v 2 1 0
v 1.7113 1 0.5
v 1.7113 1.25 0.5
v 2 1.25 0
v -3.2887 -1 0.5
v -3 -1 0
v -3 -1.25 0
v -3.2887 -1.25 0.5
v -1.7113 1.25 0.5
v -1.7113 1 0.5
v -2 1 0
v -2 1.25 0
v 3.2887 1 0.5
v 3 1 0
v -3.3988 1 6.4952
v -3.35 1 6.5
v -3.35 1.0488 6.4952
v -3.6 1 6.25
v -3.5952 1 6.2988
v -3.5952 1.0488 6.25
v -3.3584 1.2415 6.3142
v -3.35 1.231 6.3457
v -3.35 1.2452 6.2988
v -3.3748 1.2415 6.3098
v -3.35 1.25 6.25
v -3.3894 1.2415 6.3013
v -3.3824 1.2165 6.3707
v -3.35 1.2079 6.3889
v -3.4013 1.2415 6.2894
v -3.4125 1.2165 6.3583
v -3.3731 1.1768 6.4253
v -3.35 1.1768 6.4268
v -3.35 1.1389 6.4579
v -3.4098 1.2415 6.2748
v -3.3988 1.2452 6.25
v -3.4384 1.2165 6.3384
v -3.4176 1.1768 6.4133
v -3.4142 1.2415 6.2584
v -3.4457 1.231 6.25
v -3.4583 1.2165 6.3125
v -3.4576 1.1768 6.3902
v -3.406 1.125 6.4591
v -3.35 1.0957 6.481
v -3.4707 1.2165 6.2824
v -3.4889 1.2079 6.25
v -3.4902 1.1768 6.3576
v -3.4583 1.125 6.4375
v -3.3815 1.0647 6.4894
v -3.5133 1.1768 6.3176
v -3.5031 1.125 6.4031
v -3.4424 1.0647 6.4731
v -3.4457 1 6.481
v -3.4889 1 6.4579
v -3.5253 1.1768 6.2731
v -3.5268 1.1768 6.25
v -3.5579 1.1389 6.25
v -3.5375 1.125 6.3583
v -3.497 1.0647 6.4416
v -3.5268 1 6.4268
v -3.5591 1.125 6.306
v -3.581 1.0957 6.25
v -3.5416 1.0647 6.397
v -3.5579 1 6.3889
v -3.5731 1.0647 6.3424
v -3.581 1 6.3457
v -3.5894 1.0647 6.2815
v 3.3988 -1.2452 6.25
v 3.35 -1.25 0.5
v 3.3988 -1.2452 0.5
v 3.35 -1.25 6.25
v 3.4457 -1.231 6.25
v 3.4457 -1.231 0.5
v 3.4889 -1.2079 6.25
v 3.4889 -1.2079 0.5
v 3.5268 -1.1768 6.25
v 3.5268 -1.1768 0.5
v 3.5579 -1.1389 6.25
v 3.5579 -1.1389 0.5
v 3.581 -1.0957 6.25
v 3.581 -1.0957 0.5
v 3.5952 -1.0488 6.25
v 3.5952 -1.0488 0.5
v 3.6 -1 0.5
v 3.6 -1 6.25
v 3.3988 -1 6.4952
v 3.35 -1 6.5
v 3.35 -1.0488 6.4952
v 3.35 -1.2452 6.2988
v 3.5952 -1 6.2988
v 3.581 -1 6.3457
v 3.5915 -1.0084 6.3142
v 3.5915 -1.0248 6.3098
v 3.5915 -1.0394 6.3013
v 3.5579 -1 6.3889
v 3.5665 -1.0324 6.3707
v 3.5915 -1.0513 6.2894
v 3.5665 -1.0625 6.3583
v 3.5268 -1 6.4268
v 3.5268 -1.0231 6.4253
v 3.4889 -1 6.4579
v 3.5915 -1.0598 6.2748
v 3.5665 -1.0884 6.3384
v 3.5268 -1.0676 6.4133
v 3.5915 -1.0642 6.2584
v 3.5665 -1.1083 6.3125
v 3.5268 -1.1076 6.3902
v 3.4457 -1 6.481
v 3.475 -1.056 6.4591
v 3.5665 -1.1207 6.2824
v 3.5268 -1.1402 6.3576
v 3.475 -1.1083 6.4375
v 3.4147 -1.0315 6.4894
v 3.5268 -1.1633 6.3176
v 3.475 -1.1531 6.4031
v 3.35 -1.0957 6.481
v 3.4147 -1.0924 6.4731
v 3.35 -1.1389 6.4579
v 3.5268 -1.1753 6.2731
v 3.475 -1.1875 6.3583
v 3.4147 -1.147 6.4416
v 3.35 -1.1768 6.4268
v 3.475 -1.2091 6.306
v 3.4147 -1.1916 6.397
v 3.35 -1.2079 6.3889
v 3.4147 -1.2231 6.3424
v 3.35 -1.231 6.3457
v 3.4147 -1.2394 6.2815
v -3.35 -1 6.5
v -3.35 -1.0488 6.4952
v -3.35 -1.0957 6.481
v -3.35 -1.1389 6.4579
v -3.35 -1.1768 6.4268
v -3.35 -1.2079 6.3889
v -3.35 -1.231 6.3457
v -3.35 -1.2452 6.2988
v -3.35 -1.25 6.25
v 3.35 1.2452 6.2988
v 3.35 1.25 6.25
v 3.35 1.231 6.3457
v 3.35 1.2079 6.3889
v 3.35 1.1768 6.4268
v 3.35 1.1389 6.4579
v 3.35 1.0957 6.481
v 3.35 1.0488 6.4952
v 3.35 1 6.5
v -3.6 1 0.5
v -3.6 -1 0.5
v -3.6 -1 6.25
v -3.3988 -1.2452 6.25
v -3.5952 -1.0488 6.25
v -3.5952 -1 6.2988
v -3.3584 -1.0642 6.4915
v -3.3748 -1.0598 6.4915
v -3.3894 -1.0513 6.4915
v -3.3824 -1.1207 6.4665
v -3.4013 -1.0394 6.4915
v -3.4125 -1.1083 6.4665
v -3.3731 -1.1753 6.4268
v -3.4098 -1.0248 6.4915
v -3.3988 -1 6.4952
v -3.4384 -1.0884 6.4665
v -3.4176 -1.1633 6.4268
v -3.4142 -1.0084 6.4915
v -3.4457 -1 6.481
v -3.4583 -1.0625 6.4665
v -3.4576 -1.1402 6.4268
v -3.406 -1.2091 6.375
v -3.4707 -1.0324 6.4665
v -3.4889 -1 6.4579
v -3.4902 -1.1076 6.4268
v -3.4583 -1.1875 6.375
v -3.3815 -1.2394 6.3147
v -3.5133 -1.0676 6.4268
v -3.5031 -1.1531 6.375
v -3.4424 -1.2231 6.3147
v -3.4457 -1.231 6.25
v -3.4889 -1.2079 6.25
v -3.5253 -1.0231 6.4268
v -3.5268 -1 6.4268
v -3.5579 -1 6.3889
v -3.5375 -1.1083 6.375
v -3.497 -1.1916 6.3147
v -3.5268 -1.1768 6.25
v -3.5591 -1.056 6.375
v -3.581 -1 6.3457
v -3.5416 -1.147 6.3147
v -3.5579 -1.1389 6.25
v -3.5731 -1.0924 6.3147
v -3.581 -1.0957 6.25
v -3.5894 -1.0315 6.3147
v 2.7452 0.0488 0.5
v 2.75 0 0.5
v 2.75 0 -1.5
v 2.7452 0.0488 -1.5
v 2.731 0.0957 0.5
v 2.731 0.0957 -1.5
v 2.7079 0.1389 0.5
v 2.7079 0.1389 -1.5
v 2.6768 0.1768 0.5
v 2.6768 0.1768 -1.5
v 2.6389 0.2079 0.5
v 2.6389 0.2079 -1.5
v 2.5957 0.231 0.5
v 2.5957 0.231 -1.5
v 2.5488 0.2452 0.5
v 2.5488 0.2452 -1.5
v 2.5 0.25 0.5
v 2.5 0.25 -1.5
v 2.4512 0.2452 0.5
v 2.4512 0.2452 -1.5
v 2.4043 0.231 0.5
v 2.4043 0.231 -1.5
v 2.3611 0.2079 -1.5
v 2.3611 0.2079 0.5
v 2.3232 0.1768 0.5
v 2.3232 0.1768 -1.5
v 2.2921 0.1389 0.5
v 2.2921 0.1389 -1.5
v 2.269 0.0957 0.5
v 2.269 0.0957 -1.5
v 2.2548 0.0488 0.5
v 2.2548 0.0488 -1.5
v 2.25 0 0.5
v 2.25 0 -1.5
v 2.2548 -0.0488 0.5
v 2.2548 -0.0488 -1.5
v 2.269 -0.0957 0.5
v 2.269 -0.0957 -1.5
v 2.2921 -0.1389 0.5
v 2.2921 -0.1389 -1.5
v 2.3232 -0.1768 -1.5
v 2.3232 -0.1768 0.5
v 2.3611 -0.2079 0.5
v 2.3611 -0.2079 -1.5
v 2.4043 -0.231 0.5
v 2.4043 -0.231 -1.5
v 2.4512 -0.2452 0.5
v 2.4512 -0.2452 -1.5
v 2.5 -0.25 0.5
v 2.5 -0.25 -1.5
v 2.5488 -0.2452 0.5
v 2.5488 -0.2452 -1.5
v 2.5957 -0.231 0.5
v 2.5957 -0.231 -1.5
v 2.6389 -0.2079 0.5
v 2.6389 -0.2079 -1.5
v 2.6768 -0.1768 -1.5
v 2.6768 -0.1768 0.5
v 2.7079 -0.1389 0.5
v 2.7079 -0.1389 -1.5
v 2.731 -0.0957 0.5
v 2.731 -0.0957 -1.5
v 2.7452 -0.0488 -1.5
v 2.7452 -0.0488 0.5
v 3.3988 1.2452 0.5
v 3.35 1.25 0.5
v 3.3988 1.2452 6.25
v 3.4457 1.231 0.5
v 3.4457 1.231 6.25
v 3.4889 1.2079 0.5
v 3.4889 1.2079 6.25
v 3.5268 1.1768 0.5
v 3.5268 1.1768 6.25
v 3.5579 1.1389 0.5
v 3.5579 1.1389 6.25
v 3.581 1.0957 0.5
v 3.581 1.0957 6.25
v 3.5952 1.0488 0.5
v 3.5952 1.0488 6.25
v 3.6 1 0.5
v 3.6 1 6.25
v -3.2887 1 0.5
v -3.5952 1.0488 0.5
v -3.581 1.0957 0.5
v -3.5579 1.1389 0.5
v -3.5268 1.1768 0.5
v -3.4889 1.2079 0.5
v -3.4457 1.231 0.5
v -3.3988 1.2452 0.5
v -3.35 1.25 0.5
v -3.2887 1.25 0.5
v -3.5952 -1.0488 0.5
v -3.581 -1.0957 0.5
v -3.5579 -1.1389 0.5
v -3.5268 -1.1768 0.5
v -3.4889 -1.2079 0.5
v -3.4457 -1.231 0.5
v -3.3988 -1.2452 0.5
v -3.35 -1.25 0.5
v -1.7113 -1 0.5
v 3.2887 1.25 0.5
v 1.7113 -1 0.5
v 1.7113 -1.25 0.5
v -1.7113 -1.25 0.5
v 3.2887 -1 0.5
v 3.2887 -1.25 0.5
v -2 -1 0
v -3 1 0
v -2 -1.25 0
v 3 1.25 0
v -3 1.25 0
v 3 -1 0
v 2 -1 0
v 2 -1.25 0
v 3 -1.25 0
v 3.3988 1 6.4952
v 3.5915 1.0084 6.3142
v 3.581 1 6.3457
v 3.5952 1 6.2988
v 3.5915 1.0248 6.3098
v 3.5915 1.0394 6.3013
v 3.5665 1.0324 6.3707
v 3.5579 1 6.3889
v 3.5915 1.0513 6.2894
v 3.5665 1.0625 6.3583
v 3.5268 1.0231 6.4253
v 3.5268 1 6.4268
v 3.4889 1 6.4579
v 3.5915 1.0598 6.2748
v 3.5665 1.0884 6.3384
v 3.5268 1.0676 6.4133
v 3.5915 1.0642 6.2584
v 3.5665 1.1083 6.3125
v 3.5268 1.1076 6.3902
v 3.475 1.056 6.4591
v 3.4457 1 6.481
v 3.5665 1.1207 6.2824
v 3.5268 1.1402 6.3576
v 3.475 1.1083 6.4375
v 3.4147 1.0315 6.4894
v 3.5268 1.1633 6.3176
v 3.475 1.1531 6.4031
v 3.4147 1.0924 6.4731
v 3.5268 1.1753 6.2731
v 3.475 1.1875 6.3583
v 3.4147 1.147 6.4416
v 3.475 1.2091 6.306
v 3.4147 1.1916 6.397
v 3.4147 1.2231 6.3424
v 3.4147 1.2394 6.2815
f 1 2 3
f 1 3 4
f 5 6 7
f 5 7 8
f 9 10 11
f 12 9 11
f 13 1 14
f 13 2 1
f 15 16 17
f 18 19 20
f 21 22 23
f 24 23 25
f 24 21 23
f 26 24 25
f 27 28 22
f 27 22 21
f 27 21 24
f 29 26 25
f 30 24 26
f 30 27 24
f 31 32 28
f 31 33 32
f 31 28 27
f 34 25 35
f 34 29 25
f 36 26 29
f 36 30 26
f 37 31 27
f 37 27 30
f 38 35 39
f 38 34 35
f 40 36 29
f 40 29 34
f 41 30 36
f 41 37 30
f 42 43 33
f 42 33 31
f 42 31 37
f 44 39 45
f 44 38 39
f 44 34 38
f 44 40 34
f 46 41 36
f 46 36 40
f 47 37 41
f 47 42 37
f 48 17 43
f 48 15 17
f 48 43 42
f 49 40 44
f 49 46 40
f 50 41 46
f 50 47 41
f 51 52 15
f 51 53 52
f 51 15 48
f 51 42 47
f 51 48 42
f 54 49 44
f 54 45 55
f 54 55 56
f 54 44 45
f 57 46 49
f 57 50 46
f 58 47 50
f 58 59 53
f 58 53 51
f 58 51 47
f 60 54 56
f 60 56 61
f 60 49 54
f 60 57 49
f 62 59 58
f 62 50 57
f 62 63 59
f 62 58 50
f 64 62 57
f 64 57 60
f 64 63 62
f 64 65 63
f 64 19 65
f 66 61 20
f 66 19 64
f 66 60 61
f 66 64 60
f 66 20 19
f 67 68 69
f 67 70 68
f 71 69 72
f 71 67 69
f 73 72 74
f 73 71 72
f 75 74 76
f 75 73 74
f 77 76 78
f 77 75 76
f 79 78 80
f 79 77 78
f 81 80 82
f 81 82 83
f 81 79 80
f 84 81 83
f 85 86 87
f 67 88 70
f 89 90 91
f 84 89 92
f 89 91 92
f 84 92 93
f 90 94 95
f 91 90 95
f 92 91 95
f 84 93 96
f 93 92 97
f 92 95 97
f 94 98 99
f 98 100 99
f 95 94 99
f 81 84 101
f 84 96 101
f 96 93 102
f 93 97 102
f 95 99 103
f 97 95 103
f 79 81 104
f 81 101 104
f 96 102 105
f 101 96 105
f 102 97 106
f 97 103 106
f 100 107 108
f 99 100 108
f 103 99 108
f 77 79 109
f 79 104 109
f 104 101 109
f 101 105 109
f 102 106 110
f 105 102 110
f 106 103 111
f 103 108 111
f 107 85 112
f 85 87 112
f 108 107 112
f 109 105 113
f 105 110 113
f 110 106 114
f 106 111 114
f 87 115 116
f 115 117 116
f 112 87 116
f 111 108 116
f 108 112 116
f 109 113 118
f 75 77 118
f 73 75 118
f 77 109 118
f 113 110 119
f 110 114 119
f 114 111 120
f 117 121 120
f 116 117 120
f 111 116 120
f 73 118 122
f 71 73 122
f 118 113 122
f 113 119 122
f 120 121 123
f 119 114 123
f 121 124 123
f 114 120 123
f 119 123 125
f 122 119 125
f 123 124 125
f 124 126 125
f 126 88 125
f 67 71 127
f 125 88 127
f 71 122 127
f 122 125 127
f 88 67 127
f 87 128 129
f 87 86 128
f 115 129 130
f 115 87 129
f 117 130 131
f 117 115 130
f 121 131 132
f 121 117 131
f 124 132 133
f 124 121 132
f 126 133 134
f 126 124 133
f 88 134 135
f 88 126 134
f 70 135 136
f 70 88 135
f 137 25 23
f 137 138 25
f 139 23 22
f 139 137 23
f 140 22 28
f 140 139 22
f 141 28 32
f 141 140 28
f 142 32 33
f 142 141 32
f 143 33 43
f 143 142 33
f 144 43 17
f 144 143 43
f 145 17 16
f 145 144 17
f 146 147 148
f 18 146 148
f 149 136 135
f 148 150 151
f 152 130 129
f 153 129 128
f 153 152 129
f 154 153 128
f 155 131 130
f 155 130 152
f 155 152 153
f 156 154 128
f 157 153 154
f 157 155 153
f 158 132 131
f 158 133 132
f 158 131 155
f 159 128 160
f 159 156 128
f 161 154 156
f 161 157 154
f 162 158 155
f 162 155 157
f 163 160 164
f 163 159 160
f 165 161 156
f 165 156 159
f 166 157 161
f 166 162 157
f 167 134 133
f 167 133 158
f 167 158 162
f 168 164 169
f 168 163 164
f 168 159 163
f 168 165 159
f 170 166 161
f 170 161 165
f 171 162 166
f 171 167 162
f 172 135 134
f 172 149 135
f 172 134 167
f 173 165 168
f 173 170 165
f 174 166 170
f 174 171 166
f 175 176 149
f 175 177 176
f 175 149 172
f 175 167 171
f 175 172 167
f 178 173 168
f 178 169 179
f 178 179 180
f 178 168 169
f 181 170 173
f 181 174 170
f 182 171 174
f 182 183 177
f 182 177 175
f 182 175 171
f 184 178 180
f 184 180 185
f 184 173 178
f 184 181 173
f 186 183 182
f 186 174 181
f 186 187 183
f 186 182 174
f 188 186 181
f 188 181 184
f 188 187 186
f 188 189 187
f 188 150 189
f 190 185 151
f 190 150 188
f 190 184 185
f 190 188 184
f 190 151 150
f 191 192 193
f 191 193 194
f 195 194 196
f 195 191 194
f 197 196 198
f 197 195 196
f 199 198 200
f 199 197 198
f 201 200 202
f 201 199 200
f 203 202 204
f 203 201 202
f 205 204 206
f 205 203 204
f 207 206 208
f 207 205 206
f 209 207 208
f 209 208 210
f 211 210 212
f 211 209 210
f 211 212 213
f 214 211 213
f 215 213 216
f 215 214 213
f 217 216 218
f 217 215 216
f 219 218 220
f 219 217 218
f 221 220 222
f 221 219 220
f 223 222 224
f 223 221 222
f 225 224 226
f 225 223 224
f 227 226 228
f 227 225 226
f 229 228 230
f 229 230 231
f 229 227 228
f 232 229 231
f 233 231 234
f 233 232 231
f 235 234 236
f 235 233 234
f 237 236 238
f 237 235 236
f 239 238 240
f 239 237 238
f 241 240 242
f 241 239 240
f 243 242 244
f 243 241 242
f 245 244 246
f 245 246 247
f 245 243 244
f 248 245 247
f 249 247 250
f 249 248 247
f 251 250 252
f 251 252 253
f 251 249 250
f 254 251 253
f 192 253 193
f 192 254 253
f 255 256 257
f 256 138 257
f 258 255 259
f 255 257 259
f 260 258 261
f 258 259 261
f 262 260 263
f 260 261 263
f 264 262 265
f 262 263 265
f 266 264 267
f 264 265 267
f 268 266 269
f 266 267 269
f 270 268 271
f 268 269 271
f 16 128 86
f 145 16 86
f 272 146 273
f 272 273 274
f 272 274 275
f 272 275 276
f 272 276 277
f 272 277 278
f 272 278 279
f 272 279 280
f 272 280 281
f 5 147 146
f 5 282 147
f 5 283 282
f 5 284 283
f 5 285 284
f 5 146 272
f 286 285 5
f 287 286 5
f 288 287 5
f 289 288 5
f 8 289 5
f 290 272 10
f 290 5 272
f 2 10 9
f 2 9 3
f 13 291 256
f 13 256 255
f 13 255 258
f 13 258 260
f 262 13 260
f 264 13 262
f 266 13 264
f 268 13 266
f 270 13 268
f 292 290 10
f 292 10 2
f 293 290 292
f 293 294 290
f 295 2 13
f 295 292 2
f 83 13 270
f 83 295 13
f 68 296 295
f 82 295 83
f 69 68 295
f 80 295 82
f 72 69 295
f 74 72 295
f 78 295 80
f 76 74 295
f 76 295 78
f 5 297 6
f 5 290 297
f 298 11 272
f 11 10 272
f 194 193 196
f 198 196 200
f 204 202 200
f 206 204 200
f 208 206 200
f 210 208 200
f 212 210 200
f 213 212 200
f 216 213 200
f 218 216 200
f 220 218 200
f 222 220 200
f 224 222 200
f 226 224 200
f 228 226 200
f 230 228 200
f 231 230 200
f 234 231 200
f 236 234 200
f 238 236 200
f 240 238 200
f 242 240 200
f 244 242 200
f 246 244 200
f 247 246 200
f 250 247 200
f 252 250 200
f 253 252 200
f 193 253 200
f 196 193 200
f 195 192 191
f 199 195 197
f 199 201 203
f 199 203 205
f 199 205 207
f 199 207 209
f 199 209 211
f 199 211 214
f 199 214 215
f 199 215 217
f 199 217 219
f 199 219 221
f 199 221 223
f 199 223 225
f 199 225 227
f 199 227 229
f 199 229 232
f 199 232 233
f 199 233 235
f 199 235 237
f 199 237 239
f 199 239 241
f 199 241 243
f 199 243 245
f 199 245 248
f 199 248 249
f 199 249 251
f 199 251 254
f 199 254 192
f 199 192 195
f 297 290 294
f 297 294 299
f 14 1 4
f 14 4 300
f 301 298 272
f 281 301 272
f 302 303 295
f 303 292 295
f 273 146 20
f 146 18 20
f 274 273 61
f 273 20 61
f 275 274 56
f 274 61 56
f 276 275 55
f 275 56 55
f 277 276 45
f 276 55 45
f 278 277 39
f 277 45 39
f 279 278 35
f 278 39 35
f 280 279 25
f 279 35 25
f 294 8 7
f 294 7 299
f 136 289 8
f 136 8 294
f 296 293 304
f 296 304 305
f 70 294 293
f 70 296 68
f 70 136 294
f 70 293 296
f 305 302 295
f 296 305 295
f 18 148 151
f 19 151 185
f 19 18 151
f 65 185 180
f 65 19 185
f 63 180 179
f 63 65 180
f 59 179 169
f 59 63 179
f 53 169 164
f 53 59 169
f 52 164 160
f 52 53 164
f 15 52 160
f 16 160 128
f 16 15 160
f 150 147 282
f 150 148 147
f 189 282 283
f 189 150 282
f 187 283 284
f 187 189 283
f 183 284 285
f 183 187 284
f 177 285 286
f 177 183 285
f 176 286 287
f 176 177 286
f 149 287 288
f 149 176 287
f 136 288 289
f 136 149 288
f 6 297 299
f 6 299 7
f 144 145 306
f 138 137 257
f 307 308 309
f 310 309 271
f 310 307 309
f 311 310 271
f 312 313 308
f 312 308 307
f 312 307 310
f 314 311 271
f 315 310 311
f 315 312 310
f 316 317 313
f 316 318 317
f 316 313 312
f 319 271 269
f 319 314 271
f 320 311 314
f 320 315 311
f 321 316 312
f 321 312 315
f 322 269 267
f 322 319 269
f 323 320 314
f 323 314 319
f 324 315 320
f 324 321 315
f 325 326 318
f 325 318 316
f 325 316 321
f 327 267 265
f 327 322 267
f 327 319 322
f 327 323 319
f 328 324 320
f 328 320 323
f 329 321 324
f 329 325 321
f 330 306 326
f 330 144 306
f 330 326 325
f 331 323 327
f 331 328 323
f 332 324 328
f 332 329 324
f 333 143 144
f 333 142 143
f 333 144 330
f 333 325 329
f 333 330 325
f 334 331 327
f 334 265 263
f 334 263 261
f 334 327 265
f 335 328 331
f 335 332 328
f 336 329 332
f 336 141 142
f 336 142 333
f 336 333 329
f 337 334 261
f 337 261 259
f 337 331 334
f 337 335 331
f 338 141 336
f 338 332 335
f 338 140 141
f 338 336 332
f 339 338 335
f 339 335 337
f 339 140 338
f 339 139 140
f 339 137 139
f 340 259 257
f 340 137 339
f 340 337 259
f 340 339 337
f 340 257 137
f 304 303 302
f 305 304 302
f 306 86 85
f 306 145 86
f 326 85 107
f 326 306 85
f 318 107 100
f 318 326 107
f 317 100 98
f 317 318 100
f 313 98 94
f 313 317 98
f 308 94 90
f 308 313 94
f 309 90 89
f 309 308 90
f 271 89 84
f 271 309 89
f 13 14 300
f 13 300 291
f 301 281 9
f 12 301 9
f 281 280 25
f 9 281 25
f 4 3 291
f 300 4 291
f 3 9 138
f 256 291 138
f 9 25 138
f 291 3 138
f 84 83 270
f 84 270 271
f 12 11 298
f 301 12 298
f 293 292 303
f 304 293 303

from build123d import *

# Parameters (mm, degrees)
SKETCH_W                = 7.2
SKETCH_H                = 6
PAD_DEPTH               = 1.25
PAD002_DEPTH            = 0.25
PAD002_MIRRORED_2_DEPTH = 0.25
FILLET_R                = 0.25
SKETCH003_R             = 0.25
PAD003_DEPTH            = 2


with BuildPart() as body:
    # Sketch → Pad (new body, symmetric)
    with BuildSketch(Plane.XZ):
        with Locations((0, 3.5)):
            Rectangle(SKETCH_W, SKETCH_H)
    extrude(amount=PAD_DEPTH, both=True)

    # Sketch002 → Pad002 (join)
    with BuildSketch(Plane.XZ.offset(1)):
        Polygon((2, 0), (3, 0), (3.288675, 0.5), (1.711325, 0.5), align=None)
    pad002 = extrude(amount=PAD002_DEPTH)

    # Sketch002 Mirrored 2 → Pad002 Mirrored 2 (add)
    with BuildSketch(Plane(origin=(0, -1, 0), x_dir=(-1, 0, 0), z_dir=(0, 1, 0))):
        Polygon((2, 0), (3, 0), (3.288675, 0.5), (1.711325, 0.5), align=None)
    pad002_mirrored_2 = extrude(amount=-PAD002_MIRRORED_2_DEPTH)

    # Mirrored001: Pad002, Pad002 Mirrored 2 across XZ
    add(pad002.mirror(Plane.XZ))
    add(pad002_mirrored_2.mirror(Plane.XZ))

    # Fillet
    fillet_edges = [body.edges().sort_by_distance(p)[0] for p in [
        (-3.6, -1.25, 3.5),
        (0, -1.25, 6.5),
        (-3.6, 0, 6.5),
        (0, 1.25, 6.5),
        (3.6, 0, 6.5),
        (3.6, -1.25, 3.5),
        (3.6, 1.25, 3.5),
        (-3.6, 1.25, 3.5),
    ]]
    fillet(fillet_edges, radius=FILLET_R)


with BuildPart() as leadclone:
    # Sketch003 → Pad003 (new body)
    with BuildSketch(Plane.XY.offset(0.5)):
        with Locations((-2.5, 0)):
            Circle(SKETCH003_R)
    extrude(amount=-PAD003_DEPTH)


with BuildPart() as leadclone_1:
    # Body002 placement: moved
    add(leadclone.part.moved(Location((5, 0, 0))))


solid = Compound([body.part, leadclone_1.part])
